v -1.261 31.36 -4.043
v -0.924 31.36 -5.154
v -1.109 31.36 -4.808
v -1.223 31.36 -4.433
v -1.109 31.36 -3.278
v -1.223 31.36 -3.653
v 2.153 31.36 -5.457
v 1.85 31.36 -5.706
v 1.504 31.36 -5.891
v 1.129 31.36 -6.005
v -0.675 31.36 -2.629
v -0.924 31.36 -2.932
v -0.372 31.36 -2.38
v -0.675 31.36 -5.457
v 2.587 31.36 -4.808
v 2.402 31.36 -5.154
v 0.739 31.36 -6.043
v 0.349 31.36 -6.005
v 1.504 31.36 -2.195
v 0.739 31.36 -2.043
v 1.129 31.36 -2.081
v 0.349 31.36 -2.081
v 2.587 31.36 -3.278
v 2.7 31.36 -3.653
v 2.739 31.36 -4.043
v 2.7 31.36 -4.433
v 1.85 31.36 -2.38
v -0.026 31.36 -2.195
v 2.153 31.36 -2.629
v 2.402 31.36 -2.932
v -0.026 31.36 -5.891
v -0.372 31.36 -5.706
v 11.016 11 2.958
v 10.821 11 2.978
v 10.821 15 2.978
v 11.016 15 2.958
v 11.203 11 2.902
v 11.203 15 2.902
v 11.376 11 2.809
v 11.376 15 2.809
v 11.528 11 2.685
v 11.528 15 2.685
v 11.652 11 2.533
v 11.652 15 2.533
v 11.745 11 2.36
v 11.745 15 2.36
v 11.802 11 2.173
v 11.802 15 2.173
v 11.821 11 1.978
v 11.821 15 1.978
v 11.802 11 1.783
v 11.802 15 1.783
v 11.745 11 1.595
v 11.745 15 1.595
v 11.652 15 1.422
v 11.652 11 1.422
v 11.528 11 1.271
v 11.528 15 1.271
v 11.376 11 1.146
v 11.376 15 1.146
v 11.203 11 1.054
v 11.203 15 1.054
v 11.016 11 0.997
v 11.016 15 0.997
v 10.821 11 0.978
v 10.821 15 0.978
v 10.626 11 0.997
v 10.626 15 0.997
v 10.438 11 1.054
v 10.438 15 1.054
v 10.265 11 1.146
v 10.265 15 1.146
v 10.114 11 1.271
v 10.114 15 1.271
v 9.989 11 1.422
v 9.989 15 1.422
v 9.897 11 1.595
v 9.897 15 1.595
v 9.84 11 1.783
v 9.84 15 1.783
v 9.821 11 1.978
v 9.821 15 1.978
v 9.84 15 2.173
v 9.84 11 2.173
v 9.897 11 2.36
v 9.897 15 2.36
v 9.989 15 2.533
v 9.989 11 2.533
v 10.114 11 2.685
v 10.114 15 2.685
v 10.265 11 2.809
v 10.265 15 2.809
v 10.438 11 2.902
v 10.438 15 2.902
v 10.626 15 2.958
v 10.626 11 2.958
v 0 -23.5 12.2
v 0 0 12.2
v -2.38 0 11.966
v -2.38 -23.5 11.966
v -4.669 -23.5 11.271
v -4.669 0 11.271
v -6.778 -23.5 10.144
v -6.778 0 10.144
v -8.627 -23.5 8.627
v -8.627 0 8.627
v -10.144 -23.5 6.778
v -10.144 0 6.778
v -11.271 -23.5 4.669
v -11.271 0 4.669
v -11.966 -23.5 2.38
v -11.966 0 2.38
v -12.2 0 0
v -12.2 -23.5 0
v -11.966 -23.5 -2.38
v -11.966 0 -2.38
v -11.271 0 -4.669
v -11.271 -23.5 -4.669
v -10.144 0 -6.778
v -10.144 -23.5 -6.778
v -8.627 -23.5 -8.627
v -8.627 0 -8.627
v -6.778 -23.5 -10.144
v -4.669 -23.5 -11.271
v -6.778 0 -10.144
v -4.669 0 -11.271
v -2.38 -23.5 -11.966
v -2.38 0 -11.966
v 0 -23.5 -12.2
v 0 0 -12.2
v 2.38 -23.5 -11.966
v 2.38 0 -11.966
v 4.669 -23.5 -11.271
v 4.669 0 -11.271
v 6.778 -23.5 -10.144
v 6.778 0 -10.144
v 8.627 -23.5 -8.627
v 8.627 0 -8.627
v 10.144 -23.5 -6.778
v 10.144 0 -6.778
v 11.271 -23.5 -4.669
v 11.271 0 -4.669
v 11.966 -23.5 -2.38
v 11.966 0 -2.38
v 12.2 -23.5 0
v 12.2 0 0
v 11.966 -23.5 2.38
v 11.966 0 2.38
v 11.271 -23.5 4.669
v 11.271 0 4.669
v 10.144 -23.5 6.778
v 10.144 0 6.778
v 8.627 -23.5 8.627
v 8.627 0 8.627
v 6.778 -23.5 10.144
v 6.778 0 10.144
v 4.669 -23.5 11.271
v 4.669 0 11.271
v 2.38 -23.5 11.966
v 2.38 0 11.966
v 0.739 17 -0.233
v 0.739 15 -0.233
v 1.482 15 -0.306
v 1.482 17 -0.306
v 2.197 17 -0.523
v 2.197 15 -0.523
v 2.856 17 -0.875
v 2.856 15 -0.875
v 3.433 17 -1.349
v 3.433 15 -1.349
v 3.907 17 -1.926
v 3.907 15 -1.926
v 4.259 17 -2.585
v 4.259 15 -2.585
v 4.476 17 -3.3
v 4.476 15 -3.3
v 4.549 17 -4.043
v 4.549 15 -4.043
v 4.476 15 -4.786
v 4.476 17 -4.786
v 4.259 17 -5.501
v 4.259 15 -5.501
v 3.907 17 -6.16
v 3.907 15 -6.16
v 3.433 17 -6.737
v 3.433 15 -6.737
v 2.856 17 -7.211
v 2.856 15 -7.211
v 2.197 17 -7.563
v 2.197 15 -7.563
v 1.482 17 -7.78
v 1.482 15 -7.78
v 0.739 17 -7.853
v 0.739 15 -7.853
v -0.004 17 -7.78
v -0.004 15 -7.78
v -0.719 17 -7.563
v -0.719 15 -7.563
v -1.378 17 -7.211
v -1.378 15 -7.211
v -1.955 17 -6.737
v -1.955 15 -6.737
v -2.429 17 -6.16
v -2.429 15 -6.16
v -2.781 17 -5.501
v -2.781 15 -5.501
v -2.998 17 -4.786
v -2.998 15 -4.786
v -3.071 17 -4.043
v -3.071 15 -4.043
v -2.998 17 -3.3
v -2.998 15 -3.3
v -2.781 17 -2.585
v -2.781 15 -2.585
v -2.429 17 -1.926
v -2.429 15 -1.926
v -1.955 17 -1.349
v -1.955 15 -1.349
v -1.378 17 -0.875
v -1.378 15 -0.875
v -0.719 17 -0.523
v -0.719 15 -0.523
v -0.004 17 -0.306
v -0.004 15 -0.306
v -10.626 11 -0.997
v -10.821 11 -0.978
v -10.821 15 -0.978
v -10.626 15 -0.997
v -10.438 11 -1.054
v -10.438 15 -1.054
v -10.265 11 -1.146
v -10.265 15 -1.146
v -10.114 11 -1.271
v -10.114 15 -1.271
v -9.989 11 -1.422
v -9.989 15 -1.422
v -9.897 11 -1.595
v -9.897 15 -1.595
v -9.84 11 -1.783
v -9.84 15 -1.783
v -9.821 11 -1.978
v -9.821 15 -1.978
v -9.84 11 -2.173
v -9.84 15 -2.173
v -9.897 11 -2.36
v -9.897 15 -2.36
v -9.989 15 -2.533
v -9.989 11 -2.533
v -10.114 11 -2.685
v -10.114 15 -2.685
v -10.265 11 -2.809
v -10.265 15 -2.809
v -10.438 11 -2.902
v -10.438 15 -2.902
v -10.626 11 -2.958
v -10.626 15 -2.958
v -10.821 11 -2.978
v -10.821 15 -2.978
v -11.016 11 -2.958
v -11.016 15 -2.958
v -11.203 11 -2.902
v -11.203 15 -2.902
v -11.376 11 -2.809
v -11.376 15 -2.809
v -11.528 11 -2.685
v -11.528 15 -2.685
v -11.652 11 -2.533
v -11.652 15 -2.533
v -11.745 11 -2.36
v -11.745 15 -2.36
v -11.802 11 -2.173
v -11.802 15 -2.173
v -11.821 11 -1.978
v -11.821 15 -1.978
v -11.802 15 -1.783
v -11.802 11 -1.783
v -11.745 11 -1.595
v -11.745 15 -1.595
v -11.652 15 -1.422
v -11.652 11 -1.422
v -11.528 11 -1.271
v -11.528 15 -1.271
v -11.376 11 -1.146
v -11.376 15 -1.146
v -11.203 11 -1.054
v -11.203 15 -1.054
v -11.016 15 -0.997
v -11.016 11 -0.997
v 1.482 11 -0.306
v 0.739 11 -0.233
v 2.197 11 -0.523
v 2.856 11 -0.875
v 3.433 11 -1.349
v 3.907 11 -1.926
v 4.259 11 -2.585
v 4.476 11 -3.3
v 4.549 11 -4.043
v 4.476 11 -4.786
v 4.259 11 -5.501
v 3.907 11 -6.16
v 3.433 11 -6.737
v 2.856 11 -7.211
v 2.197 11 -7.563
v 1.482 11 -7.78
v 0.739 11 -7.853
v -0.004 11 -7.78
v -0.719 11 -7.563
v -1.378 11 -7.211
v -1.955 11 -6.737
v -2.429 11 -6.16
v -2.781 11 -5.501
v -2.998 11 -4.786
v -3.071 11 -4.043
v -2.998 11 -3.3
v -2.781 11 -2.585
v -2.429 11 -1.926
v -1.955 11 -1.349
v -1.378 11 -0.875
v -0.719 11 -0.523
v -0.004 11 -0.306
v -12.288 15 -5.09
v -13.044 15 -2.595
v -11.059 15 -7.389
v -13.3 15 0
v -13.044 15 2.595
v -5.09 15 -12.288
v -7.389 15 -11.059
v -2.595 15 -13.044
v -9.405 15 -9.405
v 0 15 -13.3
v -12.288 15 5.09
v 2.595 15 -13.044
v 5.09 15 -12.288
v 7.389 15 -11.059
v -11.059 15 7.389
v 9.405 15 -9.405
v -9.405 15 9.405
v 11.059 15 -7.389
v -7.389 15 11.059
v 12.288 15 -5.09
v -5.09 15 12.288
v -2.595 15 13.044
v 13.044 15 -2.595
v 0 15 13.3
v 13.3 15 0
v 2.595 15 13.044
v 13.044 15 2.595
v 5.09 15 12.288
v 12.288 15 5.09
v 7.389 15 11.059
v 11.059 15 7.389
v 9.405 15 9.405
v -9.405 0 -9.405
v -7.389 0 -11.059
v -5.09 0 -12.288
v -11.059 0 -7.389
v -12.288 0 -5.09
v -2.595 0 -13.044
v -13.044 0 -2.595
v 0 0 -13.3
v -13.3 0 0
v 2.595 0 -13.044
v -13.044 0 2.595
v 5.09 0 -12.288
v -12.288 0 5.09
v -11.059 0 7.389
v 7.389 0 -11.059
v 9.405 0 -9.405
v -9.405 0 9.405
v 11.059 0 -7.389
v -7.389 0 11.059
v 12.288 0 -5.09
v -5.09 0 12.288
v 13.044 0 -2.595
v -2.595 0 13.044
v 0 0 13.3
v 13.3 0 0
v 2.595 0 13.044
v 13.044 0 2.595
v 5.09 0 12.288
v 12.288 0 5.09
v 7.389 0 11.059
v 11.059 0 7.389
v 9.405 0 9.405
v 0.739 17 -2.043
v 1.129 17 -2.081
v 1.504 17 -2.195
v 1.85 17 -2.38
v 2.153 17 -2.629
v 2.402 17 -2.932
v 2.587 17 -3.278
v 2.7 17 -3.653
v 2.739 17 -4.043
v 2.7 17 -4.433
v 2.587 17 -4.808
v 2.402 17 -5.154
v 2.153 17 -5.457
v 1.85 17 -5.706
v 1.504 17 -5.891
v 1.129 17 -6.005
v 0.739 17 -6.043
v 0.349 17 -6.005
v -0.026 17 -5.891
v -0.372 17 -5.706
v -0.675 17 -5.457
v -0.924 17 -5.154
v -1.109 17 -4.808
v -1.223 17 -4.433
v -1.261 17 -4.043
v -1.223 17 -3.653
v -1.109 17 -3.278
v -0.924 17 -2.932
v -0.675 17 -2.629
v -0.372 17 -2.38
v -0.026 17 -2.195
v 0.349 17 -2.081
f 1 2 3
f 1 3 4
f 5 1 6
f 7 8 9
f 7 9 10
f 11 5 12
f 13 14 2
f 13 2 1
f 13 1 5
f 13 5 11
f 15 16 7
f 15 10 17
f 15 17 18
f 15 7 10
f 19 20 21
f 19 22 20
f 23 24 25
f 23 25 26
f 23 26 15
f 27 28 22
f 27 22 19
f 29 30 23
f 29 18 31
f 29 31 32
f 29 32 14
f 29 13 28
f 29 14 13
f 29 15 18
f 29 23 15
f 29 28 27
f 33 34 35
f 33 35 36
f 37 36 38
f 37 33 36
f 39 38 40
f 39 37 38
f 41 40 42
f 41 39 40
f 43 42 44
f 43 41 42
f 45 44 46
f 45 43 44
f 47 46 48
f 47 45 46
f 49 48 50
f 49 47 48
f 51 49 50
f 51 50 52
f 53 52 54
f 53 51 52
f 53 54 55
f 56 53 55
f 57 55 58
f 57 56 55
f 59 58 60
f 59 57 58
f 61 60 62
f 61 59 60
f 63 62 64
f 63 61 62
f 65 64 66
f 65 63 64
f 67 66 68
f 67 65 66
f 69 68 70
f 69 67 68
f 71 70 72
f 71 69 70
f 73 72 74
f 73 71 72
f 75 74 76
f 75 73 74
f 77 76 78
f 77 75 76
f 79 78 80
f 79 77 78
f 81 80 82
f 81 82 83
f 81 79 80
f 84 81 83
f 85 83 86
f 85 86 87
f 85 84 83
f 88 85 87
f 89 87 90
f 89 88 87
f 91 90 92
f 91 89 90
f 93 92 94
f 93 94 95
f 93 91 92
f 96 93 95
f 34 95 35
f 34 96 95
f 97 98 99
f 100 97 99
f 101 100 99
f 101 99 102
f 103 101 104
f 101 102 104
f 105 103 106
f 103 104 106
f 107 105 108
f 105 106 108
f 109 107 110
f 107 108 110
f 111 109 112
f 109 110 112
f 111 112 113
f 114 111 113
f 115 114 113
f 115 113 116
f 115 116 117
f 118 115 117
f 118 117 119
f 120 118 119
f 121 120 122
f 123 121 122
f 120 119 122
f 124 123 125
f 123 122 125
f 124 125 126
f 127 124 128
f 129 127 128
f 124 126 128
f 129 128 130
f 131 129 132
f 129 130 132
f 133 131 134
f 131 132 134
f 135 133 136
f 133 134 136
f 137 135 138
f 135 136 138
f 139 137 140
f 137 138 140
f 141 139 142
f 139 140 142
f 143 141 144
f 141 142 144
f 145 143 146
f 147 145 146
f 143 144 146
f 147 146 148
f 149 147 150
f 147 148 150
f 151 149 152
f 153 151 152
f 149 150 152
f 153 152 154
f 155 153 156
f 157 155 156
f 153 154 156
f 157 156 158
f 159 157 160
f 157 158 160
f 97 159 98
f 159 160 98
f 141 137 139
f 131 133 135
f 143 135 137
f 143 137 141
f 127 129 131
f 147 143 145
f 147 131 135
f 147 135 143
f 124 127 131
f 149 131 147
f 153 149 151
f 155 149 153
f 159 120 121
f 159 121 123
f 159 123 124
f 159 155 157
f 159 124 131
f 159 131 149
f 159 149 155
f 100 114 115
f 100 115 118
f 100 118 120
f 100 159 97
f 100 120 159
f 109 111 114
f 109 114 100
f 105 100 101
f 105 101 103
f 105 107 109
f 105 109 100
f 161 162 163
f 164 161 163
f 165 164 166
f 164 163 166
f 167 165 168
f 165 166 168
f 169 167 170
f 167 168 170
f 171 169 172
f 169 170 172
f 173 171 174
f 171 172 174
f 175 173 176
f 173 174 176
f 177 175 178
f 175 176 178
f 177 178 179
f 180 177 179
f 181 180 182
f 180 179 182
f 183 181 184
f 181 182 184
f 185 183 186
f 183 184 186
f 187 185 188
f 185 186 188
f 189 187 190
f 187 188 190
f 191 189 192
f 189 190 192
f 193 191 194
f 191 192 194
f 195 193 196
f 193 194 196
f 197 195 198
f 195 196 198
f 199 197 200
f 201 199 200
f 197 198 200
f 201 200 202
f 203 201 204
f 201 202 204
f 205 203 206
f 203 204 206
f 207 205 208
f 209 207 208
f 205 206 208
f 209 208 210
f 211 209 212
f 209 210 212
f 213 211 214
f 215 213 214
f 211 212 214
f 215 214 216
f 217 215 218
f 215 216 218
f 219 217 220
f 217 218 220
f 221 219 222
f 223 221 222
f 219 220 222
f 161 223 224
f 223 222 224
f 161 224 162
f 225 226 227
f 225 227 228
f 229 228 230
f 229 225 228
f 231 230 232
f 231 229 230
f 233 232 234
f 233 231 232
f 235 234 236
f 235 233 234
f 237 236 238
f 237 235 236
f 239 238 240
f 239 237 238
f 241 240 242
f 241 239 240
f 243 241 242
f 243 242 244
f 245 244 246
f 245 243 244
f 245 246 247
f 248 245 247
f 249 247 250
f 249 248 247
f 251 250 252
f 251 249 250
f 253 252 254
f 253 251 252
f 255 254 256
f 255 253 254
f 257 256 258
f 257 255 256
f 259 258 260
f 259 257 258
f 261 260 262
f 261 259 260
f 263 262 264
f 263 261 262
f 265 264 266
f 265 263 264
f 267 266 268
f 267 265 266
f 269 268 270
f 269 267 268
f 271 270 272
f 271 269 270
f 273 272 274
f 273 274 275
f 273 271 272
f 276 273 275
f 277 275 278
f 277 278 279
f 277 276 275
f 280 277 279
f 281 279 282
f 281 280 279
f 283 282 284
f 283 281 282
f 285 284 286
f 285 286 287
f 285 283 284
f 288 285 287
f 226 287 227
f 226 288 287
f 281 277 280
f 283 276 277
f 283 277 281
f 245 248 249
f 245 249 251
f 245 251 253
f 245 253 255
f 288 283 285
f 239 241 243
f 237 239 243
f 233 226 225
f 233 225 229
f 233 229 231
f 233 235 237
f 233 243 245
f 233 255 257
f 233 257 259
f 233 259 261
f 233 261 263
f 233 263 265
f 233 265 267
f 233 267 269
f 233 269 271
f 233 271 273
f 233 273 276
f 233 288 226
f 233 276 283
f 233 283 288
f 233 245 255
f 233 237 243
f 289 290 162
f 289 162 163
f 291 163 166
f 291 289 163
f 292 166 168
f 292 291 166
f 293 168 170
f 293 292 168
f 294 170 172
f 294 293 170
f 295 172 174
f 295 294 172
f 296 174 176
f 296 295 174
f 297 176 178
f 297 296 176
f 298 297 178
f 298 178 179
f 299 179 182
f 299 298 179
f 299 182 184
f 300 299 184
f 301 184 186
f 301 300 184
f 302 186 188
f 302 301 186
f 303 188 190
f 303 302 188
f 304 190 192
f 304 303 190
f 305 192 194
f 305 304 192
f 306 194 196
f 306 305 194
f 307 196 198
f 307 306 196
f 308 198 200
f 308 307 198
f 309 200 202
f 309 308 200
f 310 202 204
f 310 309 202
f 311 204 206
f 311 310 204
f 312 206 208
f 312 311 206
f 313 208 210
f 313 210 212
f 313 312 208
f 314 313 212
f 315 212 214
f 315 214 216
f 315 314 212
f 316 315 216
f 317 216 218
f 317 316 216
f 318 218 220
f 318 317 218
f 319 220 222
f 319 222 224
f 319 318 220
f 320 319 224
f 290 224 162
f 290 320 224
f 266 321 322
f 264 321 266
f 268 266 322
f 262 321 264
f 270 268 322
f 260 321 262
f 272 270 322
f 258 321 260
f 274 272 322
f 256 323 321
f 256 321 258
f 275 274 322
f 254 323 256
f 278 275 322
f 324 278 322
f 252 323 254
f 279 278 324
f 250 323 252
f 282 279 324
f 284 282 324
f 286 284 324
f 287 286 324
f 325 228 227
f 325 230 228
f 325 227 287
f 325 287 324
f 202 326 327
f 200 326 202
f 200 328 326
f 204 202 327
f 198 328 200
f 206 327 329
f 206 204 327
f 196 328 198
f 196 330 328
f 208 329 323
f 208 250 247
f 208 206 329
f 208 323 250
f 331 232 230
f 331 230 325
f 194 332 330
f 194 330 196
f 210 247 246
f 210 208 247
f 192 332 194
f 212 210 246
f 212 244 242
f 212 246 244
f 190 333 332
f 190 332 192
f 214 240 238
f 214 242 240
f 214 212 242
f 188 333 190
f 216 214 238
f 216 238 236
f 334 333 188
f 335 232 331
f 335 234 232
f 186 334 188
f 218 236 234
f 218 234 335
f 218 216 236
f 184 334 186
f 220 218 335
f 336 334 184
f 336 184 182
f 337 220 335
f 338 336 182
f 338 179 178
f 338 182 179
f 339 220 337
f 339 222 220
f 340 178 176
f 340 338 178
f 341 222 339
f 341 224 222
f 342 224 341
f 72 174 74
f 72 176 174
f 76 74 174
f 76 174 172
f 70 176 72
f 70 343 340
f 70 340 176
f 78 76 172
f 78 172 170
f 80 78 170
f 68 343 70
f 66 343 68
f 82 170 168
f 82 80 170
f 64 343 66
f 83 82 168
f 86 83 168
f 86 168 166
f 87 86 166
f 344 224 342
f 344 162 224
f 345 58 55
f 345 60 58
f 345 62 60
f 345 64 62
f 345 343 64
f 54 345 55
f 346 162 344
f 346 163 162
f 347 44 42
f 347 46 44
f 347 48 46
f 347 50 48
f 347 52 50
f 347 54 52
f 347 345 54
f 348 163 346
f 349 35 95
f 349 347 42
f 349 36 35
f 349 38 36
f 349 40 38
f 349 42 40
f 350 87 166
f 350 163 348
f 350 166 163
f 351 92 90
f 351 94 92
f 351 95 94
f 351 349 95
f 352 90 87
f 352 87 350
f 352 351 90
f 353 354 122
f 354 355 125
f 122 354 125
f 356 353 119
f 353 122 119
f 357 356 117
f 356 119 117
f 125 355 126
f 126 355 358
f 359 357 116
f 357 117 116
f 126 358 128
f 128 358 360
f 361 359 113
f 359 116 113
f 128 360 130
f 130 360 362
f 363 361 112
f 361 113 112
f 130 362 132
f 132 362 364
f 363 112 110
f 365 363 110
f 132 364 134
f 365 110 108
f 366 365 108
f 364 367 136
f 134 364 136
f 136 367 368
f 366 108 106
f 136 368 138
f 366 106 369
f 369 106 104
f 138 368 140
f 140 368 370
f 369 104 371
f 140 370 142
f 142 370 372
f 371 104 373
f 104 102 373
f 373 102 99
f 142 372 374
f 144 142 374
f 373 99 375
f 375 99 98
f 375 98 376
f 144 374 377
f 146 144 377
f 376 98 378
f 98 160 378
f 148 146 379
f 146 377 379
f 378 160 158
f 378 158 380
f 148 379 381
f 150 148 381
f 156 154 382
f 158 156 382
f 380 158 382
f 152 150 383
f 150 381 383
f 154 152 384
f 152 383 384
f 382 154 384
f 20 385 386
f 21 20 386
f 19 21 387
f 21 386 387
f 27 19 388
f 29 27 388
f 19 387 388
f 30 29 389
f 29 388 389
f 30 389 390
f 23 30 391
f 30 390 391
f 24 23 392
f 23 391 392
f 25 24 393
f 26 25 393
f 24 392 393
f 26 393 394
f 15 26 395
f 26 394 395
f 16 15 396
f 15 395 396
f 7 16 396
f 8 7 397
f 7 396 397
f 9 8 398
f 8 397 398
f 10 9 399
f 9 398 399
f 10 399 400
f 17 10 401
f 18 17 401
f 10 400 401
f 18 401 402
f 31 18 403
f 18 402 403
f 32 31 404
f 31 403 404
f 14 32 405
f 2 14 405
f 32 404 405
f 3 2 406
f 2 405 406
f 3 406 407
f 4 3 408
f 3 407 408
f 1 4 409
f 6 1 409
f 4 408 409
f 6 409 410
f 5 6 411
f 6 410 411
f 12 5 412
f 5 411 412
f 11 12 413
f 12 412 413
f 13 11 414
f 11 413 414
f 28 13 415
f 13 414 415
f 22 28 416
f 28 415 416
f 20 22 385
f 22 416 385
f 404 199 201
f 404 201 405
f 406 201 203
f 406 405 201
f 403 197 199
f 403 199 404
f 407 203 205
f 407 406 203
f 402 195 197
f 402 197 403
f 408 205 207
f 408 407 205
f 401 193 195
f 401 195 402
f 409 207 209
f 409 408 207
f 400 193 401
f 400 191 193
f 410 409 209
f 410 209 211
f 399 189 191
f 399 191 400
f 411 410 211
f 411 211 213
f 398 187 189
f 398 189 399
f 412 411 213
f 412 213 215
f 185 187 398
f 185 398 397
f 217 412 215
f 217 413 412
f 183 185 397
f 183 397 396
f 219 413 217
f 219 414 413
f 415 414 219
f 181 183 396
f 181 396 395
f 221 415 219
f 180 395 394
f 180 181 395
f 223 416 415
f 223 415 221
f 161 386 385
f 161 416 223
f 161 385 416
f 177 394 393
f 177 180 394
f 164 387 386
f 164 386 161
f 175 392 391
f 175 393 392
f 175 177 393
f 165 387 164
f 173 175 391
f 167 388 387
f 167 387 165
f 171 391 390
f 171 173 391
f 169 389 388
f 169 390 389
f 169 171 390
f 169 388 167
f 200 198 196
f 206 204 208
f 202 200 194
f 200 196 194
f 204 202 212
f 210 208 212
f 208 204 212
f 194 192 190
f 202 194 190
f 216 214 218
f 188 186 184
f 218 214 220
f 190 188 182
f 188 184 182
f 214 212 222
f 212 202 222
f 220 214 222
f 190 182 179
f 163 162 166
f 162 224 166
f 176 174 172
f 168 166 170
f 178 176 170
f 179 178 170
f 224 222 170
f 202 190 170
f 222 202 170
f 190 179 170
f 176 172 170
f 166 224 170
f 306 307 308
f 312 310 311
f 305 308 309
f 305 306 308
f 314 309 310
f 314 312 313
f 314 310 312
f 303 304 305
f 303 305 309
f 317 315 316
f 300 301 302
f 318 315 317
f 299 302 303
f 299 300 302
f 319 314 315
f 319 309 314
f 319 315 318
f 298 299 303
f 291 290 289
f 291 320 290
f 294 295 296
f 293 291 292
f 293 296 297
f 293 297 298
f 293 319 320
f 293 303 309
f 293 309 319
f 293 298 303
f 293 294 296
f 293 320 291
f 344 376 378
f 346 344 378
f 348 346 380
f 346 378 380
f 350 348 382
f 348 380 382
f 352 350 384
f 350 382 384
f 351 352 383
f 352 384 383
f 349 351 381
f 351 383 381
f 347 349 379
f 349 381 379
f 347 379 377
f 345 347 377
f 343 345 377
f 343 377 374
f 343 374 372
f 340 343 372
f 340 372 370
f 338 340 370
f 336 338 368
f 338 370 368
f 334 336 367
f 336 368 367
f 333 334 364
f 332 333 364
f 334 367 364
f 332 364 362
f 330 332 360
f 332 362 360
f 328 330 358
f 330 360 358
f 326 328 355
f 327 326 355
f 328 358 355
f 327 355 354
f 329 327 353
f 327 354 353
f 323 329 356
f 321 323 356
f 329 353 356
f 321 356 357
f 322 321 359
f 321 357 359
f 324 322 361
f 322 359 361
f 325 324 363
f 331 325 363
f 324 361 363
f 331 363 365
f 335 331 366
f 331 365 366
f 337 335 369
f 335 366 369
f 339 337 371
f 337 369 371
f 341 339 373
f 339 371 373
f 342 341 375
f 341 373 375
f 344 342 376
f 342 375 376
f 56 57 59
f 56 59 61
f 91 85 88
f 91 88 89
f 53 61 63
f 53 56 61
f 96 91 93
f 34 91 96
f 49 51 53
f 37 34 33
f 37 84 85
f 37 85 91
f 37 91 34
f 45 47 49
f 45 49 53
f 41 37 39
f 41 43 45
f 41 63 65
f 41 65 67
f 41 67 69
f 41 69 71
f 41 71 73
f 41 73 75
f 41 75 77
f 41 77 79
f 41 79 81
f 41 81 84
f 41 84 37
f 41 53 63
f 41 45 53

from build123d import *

# Parameters (mm, degrees)
SKETCH1_R           = 13.3
BOSS_EXTRUDE1_DEPTH = 15
SKETCH2_R           = 12.2
BOSS_EXTRUDE2_DEPTH = 23.5
SKETCH3_R           = 3.81
BOSS_EXTRUDE4_DEPTH = 2
CUT_EXTRUDE2_START  = -4
SKETCH3_6_R         = 1
SKETCH3_6_R_2       = 3.81
CUT_EXTRUDE2_DEPTH  = 4
SKETCH7_R           = 2
BOSS_EXTRUDE5_DEPTH = 14.36


with BuildPart() as part:
    # Sketch1 → Boss-Extrude1 (new body)
    with BuildSketch(Plane(origin=(0, 0, 0), x_dir=(1, 0, 0), z_dir=(0, 1, 0))):
        Circle(SKETCH1_R)
    extrude(amount=BOSS_EXTRUDE1_DEPTH)

    # Sketch2 → Boss-Extrude2 (add)
    with BuildSketch(Plane.XZ):
        Circle(SKETCH2_R)
    extrude(amount=BOSS_EXTRUDE2_DEPTH)

    # Sketch3 → Boss-Extrude4 (add)
    with BuildSketch(Plane(origin=(0, 15, 0), x_dir=(1, 0, 0), z_dir=(0, 1, 0))):
        with Locations((0.738912194, 4.043032126)):
            Circle(SKETCH3_R)
    extrude(amount=BOSS_EXTRUDE4_DEPTH)

    # Sketch3<6> → Cut-Extrude2 (cut)
    with BuildSketch(Plane(origin=(0, 15, 0), x_dir=(1, 0, 0), z_dir=(0, 1, 0)).offset(CUT_EXTRUDE2_START)):
        with Locations((10.820767246, -1.977623877)):
            Circle(SKETCH3_6_R)
        with Locations((-10.820767246, 1.977623877)):
            Circle(SKETCH3_6_R)
        with Locations((0.738912194, 4.043032126)):
            Circle(SKETCH3_6_R_2)
    extrude(amount=CUT_EXTRUDE2_DEPTH, mode=Mode.SUBTRACT)


with BuildPart() as cut_extrude2_piece_1:
    # of the separate pieces the step leaves, piece 1, a body of its own (cut_extrude2_pieces)
    add(part.part.solids().sort_by_distance((13.3, 0, 0))[0])


with BuildPart() as cut_extrude2_piece_2:
    # of the separate pieces the step leaves, piece 2, a body of its own (cut_extrude2_pieces)
    add(part.part.solids().sort_by_distance((4.548912194, 17, -4.043032126))[0])

    # Sketch7 → Boss-Extrude5 (add)
    with BuildSketch(Plane(origin=(0, 17, 0), x_dir=(1, 0, 0), z_dir=(0, 1, 0))):
        with Locations((0.738912194, 4.043032126)):
            Circle(SKETCH7_R)
    extrude(amount=BOSS_EXTRUDE5_DEPTH)


solid = Compound([cut_extrude2_piece_1.part, cut_extrude2_piece_2.part])
